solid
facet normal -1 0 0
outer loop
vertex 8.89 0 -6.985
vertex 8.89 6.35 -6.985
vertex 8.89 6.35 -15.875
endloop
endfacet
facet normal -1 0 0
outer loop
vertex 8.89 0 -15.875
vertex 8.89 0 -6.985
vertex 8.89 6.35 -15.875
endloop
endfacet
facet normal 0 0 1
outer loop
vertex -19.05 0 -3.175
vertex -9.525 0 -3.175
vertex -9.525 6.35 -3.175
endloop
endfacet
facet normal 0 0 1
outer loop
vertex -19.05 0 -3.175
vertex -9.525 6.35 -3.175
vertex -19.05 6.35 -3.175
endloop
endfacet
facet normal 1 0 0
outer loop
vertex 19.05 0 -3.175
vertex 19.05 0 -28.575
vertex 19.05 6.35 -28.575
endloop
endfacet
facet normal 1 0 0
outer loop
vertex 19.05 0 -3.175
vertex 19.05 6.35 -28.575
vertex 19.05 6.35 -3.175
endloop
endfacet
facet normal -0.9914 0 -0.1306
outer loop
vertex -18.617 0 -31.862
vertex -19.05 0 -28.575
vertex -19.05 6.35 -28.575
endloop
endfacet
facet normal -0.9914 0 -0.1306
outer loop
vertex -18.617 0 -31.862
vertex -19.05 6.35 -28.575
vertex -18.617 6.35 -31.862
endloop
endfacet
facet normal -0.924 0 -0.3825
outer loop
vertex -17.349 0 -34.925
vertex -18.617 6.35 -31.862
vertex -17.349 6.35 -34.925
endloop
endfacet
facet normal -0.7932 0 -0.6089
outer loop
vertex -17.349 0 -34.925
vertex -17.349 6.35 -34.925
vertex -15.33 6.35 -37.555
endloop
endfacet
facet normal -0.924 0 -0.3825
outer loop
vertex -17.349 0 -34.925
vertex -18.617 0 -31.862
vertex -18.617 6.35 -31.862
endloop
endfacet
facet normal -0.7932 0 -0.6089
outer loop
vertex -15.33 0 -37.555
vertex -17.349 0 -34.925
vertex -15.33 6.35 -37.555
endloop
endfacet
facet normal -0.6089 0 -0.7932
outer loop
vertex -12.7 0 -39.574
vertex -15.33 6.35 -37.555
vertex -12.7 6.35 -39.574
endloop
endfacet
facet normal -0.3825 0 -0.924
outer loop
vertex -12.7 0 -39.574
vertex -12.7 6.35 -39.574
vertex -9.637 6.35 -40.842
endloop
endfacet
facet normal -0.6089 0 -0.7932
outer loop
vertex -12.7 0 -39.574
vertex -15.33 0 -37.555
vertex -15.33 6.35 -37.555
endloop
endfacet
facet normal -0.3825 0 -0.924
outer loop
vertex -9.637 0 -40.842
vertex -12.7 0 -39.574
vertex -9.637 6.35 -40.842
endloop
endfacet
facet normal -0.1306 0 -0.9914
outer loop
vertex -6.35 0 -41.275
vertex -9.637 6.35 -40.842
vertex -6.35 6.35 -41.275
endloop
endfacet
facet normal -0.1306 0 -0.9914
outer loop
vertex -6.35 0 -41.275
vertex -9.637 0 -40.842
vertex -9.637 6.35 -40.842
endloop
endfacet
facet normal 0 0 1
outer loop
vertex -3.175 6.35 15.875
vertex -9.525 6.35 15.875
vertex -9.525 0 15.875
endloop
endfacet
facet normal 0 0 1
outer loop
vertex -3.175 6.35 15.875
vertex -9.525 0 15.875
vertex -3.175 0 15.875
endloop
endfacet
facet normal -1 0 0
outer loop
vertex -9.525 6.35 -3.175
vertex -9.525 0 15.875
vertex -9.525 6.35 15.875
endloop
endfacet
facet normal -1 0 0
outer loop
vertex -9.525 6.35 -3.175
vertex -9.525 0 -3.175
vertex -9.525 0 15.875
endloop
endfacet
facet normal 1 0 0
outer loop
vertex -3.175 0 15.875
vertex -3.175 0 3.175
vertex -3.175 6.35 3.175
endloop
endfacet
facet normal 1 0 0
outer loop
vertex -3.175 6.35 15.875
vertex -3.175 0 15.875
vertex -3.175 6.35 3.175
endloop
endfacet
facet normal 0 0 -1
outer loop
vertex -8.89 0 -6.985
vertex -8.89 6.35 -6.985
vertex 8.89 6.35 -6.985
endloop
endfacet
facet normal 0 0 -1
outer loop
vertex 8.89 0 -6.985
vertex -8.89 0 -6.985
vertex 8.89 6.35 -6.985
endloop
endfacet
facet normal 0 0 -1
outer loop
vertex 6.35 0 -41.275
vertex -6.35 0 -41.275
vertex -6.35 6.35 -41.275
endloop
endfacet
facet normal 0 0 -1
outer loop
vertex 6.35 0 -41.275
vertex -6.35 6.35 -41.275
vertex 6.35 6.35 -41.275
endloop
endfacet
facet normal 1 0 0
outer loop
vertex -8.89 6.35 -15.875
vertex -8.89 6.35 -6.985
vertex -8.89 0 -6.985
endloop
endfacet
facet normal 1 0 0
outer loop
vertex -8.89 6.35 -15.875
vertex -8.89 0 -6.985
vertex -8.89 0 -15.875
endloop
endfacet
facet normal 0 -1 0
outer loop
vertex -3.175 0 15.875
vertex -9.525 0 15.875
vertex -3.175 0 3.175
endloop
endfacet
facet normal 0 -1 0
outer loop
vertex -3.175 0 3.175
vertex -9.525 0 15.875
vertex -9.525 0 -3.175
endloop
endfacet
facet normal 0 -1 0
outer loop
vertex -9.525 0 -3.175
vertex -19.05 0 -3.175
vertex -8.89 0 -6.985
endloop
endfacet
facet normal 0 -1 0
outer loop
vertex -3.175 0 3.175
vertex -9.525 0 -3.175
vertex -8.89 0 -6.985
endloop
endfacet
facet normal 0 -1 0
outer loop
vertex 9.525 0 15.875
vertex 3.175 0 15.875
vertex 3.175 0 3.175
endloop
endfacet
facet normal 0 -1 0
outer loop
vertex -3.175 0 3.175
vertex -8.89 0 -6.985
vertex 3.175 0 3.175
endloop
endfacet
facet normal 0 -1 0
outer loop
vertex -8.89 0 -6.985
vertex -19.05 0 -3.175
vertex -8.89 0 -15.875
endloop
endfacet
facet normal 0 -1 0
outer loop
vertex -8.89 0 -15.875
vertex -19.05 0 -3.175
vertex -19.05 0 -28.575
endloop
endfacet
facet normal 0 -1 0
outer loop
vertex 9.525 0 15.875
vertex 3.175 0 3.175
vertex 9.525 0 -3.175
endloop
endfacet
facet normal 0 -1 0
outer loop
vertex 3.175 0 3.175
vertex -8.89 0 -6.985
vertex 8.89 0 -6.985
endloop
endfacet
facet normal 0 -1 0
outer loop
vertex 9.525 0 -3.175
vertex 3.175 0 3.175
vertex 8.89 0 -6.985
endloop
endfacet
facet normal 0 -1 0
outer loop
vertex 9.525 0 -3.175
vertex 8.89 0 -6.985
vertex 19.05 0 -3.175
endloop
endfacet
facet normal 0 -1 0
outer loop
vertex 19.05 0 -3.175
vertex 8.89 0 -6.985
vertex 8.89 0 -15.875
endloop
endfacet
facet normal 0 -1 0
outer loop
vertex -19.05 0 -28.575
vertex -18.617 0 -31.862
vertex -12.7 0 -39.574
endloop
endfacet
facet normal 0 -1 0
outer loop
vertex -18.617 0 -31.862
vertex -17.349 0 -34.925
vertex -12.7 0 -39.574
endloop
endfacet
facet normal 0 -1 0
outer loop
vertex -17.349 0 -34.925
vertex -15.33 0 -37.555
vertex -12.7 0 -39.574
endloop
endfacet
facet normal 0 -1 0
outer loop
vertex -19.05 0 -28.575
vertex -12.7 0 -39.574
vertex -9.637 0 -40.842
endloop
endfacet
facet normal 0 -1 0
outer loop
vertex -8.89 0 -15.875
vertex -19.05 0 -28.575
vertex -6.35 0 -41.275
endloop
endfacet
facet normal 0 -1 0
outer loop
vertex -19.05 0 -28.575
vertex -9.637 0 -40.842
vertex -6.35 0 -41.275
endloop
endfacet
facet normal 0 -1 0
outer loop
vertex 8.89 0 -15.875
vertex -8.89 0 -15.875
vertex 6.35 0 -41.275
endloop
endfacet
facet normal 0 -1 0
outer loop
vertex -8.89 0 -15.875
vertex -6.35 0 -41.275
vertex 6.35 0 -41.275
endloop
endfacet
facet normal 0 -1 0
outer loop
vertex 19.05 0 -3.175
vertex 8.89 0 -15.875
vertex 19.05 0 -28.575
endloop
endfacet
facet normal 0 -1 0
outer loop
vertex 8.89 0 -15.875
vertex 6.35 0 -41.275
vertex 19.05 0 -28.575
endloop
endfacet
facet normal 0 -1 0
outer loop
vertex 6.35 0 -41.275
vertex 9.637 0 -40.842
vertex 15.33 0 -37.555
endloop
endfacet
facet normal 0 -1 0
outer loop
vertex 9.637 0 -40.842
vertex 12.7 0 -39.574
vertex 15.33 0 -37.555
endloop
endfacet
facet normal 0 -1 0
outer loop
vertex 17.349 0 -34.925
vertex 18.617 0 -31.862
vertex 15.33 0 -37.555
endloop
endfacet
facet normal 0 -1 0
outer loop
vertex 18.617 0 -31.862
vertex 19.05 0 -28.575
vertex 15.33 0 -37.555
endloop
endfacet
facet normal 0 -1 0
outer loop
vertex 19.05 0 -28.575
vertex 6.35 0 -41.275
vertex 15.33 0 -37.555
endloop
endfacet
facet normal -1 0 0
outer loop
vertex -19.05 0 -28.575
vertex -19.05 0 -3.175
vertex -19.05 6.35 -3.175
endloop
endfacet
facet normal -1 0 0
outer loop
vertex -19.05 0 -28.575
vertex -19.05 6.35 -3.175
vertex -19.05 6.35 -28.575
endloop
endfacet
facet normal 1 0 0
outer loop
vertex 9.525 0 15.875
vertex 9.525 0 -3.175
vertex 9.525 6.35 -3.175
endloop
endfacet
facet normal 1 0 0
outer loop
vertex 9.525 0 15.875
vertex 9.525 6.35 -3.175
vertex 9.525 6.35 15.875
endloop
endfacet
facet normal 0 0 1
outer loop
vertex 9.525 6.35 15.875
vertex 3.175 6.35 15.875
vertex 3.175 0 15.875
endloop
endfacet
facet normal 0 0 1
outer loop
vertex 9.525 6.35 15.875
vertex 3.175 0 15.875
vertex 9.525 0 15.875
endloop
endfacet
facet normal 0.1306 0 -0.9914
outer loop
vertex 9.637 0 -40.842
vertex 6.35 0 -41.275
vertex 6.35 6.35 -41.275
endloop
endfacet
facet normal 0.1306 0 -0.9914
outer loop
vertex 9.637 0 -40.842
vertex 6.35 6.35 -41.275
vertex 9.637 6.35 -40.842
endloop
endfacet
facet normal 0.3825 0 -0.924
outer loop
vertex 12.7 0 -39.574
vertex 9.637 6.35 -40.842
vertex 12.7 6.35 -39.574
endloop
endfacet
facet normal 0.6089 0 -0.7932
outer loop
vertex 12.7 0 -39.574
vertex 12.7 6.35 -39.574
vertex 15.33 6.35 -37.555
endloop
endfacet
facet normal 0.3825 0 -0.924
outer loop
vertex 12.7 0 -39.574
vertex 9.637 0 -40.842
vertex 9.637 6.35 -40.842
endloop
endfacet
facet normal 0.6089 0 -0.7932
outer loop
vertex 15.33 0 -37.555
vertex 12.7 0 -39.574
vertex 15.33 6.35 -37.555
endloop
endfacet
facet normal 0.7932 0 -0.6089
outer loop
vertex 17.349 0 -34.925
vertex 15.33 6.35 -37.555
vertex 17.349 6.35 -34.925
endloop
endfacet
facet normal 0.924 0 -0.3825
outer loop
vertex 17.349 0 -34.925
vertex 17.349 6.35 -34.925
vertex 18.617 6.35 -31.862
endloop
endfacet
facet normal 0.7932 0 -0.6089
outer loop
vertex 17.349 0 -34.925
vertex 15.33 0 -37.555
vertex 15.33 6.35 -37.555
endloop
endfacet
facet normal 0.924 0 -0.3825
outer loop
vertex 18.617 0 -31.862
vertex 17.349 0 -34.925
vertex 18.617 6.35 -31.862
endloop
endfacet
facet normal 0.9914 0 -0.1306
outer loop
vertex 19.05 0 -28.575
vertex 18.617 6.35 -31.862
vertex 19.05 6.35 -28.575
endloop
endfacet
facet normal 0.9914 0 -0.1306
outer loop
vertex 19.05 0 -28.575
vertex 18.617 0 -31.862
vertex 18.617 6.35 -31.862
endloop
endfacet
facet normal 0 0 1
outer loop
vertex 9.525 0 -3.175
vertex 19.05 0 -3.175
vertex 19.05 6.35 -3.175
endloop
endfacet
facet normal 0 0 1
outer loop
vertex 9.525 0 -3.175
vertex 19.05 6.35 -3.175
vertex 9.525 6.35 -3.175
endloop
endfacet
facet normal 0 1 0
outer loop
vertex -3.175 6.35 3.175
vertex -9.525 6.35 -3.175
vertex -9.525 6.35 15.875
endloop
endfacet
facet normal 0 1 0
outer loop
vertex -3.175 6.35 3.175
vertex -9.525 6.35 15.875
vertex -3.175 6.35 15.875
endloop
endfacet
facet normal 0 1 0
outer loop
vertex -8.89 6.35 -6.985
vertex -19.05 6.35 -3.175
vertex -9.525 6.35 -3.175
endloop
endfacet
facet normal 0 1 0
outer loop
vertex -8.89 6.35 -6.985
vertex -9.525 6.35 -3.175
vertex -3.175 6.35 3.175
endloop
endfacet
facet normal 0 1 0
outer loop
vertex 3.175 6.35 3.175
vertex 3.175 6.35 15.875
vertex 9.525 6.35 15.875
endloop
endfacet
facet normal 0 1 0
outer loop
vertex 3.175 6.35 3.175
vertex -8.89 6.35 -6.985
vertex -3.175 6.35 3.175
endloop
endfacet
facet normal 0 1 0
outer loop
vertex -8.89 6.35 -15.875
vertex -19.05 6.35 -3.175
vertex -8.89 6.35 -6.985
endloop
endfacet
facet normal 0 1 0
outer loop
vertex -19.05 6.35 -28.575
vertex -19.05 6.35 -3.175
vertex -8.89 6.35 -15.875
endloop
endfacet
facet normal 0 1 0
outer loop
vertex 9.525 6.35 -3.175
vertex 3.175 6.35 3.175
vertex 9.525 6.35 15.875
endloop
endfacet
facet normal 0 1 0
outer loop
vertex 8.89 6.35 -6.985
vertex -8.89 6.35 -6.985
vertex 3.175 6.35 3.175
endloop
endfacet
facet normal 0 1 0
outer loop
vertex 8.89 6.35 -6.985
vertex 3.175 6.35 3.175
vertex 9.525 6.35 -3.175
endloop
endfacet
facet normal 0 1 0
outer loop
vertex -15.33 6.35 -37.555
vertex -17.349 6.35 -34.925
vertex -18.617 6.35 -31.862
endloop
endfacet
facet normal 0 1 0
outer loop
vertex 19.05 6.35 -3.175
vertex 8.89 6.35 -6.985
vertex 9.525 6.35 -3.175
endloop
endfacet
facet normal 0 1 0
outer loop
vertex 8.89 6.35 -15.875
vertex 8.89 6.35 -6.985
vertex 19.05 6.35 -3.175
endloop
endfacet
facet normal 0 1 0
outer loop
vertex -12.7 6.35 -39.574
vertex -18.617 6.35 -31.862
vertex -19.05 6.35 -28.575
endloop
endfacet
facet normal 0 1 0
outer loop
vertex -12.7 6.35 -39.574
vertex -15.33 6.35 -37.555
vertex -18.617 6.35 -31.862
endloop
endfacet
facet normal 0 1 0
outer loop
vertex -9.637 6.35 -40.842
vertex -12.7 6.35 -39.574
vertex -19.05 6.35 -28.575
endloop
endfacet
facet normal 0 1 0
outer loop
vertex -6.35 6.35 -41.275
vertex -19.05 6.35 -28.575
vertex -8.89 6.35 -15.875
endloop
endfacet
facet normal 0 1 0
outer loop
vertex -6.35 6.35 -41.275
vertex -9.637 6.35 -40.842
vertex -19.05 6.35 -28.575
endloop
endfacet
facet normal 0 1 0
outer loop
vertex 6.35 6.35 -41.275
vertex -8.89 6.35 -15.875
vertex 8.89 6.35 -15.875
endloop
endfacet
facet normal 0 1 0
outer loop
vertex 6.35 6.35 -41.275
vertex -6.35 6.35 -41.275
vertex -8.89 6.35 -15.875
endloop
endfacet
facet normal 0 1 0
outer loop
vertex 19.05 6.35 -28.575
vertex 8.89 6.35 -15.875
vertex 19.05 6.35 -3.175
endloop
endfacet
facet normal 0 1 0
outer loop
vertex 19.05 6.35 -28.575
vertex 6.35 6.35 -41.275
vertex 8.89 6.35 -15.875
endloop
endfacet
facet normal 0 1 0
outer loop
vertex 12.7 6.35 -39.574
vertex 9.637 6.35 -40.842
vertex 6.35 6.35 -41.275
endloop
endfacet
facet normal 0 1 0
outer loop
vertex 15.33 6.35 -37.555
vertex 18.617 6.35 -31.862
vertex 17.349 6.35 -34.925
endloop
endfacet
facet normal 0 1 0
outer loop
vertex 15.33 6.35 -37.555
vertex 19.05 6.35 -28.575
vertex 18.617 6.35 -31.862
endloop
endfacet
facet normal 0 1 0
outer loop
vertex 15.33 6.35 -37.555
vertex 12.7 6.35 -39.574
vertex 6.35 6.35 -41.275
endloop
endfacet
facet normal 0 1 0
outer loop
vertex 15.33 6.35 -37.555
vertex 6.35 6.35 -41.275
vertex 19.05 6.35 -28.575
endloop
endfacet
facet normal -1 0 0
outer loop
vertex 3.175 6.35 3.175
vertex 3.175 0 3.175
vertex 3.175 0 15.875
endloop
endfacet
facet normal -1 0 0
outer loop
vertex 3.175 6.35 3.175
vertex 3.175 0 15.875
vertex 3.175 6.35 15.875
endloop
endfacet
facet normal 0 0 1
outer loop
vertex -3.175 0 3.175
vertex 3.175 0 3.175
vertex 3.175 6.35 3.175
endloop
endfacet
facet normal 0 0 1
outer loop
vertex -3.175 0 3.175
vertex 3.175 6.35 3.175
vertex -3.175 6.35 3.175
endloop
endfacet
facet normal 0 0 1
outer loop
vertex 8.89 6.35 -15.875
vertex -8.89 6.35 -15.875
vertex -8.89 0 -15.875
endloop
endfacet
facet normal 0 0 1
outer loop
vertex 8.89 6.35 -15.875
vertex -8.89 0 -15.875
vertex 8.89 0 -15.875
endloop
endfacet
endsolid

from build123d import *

# Parameters (mm, degrees)
BOSS_EXTRUDE1_DEPTH = 6.35
SKETCH2_W           = 17.78
SKETCH2_H           = 8.89
CUT_EXTRUDE1_DEPTH  = 6.35
SKETCH3_W           = 6.35
SKETCH3_H           = 6.35
BOSS_EXTRUDE2_DEPTH = 12.7


with BuildPart() as part:
    # Sketch1 → Boss-Extrude1 (new body)
    with BuildSketch(Plane(origin=(0, 0, 0), x_dir=(1, 0, 0), z_dir=(0, 1, 0))):
        with BuildLine():
            Line((9.525, -3.175), (-9.525, -3.175))
            Line((-9.525, -3.175), (-9.525, 3.175))
            Line((-9.525, 3.175), (-19.05, 3.175))
            Line((-19.05, 3.175), (-19.05, 28.575))
            ThreePointArc((-19.05, 28.575), (-15.330256121, 37.555256121), (-6.35, 41.275))
            Line((-6.35, 41.275), (6.35, 41.275))
            ThreePointArc((6.35, 41.275), (15.330256121, 37.555256121), (19.05, 28.575))
            Line((19.05, 28.575), (19.05, 3.175))
            Line((19.05, 3.175), (9.525, 3.175))
            Line((9.525, 3.175), (9.525, -3.175))
        make_face()
    extrude(amount=BOSS_EXTRUDE1_DEPTH)

    # Sketch2 → Cut-Extrude1 (cut)
    with BuildSketch(Plane(origin=(0, 6.35, 0), x_dir=(1, 0, 0), z_dir=(0, 1, 0))):
        with Locations((0, 11.43)):
            Rectangle(SKETCH2_W, SKETCH2_H)
    extrude(amount=-CUT_EXTRUDE1_DEPTH, mode=Mode.SUBTRACT)

    # Sketch3 → Boss-Extrude2 (add)
    with BuildSketch(Plane.XY.offset(3.175)):
        with Locations((-6.35, 3.175)):
            Rectangle(SKETCH3_W, SKETCH3_H)
        with Locations((6.35, 3.175)):
            Rectangle(SKETCH3_W, SKETCH3_H)
    extrude(amount=BOSS_EXTRUDE2_DEPTH)


solid = part.part
